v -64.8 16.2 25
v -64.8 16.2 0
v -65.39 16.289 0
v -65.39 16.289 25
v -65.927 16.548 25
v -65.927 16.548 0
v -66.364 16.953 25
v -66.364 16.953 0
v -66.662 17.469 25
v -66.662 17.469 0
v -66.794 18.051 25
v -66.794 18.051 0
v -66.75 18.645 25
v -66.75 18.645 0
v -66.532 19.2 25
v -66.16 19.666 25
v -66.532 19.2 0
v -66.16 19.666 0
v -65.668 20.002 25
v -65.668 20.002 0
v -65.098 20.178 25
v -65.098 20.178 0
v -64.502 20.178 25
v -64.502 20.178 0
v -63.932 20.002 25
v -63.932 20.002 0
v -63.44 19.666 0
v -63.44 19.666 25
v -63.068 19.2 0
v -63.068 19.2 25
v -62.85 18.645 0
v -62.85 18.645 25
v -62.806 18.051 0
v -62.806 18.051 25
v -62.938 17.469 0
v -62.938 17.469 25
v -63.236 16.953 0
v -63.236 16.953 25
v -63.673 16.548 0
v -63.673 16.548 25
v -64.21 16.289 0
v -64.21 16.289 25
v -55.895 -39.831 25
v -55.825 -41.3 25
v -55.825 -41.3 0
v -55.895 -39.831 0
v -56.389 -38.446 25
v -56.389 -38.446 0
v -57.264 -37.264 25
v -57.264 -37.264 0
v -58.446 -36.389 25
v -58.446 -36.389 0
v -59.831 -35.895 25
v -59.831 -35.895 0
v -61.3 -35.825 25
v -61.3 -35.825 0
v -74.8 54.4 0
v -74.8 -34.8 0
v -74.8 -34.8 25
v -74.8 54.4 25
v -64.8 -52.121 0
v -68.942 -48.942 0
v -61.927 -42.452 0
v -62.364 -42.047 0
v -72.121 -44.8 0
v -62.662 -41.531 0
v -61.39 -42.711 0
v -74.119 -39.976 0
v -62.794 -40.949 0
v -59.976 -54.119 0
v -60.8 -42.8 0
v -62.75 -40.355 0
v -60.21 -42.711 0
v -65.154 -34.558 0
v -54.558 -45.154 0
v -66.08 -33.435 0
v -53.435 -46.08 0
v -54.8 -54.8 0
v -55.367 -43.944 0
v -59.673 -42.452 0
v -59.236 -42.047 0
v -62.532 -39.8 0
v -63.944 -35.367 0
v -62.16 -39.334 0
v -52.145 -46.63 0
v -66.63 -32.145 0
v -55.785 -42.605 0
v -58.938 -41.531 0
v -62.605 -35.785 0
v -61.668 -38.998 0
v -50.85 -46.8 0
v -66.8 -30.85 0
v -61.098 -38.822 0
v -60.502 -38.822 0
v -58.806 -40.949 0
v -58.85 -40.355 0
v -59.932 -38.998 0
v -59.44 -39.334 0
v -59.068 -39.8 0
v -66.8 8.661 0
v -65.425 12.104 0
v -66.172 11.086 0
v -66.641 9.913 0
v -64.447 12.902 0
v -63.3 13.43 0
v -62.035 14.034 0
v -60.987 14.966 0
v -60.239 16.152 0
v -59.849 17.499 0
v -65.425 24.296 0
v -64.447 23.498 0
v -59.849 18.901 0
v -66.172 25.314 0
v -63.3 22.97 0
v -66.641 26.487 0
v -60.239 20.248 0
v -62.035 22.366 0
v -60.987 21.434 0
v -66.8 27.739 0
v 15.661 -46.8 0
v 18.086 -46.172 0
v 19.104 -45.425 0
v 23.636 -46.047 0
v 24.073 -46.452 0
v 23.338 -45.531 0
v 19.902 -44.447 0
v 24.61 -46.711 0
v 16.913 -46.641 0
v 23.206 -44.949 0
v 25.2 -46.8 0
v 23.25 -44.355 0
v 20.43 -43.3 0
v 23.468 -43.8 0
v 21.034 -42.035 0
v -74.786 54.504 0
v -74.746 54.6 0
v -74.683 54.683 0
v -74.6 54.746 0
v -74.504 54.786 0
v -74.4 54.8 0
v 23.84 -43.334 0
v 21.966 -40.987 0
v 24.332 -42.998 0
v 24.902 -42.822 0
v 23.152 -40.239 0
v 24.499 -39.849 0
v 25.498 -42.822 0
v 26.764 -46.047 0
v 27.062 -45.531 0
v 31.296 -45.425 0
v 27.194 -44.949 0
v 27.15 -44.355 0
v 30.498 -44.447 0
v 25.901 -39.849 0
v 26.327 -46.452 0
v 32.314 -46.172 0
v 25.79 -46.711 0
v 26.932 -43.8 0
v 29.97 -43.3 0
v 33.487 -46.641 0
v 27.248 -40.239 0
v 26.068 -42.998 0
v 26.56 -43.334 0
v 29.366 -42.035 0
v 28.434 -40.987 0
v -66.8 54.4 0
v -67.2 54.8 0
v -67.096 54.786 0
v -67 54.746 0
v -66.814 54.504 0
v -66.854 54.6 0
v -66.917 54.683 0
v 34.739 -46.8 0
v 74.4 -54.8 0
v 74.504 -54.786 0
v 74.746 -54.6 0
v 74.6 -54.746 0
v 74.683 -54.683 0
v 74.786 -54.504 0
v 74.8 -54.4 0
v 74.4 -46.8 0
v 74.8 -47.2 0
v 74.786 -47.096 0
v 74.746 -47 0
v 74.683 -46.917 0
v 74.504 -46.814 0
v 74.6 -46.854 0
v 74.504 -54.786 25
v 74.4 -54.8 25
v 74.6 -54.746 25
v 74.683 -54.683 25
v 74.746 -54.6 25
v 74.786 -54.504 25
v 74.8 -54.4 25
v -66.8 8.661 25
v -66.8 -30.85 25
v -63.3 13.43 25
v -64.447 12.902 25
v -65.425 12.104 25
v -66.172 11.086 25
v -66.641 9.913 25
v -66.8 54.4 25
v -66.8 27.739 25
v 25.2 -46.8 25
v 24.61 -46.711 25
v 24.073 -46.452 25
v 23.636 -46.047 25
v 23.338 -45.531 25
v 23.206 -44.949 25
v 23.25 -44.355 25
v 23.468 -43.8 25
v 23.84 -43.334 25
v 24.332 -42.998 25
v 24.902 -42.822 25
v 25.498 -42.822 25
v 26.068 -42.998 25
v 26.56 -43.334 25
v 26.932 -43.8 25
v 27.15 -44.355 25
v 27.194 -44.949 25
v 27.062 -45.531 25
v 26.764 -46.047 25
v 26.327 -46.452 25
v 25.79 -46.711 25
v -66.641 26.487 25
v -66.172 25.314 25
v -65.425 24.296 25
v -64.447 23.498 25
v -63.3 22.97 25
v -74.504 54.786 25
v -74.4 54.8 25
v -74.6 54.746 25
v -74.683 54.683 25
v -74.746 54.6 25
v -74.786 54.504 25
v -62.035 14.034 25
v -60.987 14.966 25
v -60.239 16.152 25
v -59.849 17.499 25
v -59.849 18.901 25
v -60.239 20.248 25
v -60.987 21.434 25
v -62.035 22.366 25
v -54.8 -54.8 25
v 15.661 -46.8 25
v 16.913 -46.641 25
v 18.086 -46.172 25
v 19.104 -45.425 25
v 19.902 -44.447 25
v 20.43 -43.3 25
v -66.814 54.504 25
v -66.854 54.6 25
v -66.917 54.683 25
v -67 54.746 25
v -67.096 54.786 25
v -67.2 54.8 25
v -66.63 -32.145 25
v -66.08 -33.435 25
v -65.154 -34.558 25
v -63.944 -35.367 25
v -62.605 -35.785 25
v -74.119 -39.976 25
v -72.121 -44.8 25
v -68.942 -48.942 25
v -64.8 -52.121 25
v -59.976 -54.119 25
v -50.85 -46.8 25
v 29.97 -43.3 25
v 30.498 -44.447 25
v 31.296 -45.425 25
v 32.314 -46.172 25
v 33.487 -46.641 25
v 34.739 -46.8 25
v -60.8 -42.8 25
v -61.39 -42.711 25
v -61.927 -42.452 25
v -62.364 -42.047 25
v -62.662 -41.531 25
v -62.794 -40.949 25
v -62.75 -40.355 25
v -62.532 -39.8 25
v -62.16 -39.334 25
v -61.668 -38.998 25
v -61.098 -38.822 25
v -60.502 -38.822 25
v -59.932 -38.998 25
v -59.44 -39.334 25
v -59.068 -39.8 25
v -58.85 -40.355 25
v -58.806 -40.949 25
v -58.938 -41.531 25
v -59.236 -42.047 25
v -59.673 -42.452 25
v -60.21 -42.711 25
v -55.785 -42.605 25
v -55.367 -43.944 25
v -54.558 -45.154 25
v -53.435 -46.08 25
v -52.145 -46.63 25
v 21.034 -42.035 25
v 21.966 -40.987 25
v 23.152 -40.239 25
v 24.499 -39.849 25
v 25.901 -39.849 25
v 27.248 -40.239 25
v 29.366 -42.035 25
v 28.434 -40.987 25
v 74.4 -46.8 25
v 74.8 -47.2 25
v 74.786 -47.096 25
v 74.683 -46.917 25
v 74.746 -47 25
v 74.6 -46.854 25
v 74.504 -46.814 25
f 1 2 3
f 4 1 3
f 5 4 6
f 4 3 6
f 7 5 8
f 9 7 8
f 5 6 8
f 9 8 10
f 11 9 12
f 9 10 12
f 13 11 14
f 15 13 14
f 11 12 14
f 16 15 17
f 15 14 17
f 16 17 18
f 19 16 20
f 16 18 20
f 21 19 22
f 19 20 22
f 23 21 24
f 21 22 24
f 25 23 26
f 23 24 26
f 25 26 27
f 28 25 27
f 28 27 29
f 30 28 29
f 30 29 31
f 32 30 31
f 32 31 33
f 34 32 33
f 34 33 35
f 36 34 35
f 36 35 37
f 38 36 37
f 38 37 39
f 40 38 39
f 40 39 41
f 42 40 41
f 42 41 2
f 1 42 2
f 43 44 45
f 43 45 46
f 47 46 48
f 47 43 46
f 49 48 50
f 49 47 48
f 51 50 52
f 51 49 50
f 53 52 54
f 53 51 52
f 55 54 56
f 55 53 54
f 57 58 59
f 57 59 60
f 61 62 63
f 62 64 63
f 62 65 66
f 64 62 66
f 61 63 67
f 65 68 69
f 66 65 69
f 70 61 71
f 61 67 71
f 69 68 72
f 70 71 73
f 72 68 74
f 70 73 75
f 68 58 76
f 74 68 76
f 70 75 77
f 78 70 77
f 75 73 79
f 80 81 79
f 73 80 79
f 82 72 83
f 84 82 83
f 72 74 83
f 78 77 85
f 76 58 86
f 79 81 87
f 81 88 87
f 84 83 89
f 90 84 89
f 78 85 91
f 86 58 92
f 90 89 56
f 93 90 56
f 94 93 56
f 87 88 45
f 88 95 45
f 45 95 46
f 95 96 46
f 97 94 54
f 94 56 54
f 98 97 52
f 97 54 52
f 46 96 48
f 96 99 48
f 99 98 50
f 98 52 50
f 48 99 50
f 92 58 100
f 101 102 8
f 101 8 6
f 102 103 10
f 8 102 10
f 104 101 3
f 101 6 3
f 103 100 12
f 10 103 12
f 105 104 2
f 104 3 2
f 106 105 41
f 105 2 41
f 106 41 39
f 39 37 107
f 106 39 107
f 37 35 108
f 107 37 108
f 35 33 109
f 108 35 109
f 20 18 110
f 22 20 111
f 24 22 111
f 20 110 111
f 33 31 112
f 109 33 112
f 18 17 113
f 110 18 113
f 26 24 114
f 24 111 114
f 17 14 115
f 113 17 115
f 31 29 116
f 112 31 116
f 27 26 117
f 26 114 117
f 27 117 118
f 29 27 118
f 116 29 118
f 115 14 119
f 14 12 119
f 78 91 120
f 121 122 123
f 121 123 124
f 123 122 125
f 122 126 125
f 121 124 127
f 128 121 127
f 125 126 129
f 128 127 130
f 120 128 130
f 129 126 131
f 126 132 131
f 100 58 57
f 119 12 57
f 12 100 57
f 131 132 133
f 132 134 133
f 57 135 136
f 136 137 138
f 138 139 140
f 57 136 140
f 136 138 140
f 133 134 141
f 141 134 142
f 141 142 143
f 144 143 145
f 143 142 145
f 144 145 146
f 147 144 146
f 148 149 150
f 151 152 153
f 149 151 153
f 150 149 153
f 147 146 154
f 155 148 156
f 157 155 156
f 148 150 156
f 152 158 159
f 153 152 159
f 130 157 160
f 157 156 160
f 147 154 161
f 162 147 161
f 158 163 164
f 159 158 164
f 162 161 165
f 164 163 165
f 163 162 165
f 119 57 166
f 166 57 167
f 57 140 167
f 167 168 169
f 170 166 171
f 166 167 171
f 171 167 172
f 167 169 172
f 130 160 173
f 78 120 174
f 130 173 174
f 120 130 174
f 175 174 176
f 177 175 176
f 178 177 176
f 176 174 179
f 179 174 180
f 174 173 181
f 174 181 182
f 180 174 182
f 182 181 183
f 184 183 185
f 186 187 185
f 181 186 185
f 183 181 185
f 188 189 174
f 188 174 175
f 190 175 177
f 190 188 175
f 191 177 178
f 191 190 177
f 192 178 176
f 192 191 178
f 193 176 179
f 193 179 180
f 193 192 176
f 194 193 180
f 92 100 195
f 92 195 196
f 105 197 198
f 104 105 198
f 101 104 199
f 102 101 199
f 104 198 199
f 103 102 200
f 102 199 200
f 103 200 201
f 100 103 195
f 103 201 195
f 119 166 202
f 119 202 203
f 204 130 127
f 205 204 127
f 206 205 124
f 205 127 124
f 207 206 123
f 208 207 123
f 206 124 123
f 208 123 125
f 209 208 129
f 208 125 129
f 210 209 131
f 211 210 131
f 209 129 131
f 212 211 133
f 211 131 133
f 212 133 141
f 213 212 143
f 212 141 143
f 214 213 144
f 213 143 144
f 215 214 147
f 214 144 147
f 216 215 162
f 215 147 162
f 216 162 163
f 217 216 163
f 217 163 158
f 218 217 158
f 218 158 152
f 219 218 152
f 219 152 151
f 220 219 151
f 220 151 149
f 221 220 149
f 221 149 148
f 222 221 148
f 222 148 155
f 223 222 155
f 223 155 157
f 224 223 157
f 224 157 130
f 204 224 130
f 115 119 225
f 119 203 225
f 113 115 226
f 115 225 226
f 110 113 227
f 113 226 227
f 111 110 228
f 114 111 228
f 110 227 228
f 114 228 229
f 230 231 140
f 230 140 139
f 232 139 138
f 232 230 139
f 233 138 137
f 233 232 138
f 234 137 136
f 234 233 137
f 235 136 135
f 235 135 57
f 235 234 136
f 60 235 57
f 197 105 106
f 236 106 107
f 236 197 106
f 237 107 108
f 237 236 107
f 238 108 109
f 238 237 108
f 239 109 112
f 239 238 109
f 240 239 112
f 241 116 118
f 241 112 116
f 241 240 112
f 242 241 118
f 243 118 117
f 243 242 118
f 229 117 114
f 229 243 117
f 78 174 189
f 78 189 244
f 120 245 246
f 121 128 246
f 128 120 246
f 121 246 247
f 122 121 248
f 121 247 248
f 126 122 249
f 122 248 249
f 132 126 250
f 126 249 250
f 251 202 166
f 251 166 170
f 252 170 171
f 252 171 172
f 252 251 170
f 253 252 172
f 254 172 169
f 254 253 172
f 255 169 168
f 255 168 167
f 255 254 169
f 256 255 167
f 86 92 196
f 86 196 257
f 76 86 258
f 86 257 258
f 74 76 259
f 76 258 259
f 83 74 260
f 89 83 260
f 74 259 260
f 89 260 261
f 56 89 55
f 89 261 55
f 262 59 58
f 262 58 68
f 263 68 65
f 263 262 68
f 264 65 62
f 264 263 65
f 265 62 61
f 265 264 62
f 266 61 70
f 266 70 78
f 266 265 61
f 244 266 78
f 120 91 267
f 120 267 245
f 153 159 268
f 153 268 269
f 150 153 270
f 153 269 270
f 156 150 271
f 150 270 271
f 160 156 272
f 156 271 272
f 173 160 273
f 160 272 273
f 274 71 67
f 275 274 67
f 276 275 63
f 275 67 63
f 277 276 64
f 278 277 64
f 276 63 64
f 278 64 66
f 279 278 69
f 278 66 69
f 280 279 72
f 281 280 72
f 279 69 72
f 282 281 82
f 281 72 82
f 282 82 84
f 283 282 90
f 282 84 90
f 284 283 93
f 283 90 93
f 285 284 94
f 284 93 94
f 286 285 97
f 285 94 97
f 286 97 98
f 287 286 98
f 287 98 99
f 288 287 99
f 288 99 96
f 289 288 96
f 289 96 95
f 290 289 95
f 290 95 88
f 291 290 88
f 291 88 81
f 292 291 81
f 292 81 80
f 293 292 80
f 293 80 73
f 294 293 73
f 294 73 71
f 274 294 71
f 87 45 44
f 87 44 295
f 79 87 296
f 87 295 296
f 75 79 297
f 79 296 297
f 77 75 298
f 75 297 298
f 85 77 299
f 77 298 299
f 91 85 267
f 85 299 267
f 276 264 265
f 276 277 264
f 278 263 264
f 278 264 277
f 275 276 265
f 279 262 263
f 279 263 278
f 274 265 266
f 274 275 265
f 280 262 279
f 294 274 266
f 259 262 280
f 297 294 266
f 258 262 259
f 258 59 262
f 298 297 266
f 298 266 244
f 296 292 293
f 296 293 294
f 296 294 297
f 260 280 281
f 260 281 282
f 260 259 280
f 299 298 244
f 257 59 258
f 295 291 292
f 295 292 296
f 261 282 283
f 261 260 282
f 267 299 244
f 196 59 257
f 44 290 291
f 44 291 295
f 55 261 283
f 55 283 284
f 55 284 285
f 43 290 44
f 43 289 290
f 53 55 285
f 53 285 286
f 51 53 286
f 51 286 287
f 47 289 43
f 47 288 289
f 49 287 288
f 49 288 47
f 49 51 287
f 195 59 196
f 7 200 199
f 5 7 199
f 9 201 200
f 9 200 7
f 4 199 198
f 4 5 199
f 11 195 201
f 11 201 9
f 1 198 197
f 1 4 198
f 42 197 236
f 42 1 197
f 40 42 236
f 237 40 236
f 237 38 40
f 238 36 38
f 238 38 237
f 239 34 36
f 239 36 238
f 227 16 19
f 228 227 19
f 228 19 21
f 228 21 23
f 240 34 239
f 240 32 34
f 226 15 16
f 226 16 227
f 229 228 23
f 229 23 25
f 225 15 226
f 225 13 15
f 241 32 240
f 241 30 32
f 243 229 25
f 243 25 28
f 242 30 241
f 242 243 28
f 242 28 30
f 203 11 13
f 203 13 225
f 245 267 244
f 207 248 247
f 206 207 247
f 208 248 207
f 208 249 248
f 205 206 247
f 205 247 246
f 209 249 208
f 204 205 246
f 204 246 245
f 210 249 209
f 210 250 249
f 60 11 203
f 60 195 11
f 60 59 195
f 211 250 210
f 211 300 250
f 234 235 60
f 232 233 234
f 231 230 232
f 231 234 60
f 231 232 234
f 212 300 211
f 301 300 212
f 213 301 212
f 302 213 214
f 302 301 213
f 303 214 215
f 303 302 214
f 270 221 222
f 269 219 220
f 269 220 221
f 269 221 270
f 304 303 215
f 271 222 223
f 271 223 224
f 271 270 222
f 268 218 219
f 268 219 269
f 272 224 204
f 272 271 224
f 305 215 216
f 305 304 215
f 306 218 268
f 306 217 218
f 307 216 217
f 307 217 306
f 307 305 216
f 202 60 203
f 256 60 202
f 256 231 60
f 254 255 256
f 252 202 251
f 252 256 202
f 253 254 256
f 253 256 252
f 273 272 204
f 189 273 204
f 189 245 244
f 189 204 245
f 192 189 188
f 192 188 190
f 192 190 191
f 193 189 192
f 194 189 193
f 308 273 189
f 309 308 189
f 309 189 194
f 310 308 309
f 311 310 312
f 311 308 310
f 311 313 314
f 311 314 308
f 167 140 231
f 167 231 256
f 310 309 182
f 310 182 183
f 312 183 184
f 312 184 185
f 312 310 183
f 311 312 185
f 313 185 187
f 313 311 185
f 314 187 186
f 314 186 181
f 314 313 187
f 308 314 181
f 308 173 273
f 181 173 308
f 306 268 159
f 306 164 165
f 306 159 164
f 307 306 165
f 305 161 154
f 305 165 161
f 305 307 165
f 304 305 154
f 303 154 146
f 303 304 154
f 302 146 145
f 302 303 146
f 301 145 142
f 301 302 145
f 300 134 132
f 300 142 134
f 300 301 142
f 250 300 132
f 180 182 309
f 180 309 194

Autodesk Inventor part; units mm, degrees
ref_plane "YZ Plane" through (0, 0, 0) normal (1, 0, 0) x (0, 1, 0)
ref_plane "XZ Plane" through (0, 0, 0) normal (0, 1, 0) x (-1, 0, 0)
ref_plane "XY Plane" through (0, 0, 0) normal (0, 0, 1) x (1, 0, 0)
sketch "Sketch1" plane through (0, 0, 0) normal (0, 0, 1) x (1, 0, 0)
  line L0 (-74.8, 54.8) -> (74.8, 54.8)
  line L1 (74.8, 54.8) -> (74.8, -54.8)
  line L2 (74.8, -54.8) -> (-74.8, -54.8)
  line L3 (-74.8, -54.8) -> (-74.8, 54.8)
  line L4 (-74.8, 54.8) -> (74.8, -54.8) construction
  line L5 (74.8, 54.8) -> (-74.8, -54.8) construction
  line L6 (-66.8, 54.8) -> (-66.8, -46.8)
  line L7 (-66.8, -46.8) -> (74.8, -46.8)
  point P0 (0, 0)
  dimension "d0" = 149.6
  dimension "d1" = 109.6
  dimension "d2" = 8
  dimension "d3" = 8
extrude "Extrusion1" add sketch "Sketch1" along normal blind 25 contours L0 L6 L7 L1 L2 L3
fillet "Fillet1" radius 12 1 edges at (-66.8, -46.8, 12.5)
fillet "Fillet2" radius 20 1 edges at (-74.8, -54.8, 12.5)
sketch "Sketch2" plane through (0, 0, 25) normal (0, 0, 1) x (1, 0, 0)
  circle A0 centre (25.2, -44.8) radius 5
  circle A1 centre (-60.8, -40.8) radius 5
  circle A2 centre (-64.8, 18.2) radius 5
  line L0 (-54.8, -54.8) -> (74.8, -54.8) projected
  line L1 (-74.8, 54.8) -> (-74.8, -34.8) projected
  point P0 (0, 0)
  dimension "d8" = 10
  dimension "d9" = 10
  dimension "d10" = 14
  dimension "d11" = 14
  dimension "d12" = 73
  dimension "d13" = 100
  dimension "d14" = 10
extrude "Extrusion2" add sketch "Sketch2" against normal up to surface (25 mm away)
sketch "Sketch3" plane through (0, 0, 25) normal (0, 0, 1) x (1, 0, 0)
  arc A0 (-66.8, 13.6174) -> (-66.8, 22.7826) centre (-64.8, 18.2) ccw projected
  arc A1 (-59.8147, -45.702) -> (-65.702, -39.8147) centre (-60.8, -40.8) ccw projected
  arc A2 (29.7826, -46.8) -> (20.6174, -46.8) centre (25.2, -44.8) ccw projected
  point P0 (0, 0)
hole "Hole1" at (-64.8, 18.2, 25) at (-60.8, -40.8, 25) at (25.2, -44.8, 25) direction (0, 0, -1) diameter 4 end through all
fillet "Fillet3" radius 5 6 edges at (29.7826, -46.8, 12.5) (20.6174, -46.8, 12.5) (-65.702, -39.8147, 12.5) (-59.8147, -45.702, 12.5) (-66.8, 22.7826, 12.5) (-66.8, 13.6174, 12.5)
fillet "Fillet4" radius 0.4 4 edges at (-74.8, 54.8, 12.5) (-66.8, 54.8, 12.5) (74.8, -54.8, 12.5) (74.8, -46.8, 12.5)
equation "\"d3\" = d2"
equation "\"d9\" = d8"
equation "\"d11\" = d10"
properties part number "Corner"
